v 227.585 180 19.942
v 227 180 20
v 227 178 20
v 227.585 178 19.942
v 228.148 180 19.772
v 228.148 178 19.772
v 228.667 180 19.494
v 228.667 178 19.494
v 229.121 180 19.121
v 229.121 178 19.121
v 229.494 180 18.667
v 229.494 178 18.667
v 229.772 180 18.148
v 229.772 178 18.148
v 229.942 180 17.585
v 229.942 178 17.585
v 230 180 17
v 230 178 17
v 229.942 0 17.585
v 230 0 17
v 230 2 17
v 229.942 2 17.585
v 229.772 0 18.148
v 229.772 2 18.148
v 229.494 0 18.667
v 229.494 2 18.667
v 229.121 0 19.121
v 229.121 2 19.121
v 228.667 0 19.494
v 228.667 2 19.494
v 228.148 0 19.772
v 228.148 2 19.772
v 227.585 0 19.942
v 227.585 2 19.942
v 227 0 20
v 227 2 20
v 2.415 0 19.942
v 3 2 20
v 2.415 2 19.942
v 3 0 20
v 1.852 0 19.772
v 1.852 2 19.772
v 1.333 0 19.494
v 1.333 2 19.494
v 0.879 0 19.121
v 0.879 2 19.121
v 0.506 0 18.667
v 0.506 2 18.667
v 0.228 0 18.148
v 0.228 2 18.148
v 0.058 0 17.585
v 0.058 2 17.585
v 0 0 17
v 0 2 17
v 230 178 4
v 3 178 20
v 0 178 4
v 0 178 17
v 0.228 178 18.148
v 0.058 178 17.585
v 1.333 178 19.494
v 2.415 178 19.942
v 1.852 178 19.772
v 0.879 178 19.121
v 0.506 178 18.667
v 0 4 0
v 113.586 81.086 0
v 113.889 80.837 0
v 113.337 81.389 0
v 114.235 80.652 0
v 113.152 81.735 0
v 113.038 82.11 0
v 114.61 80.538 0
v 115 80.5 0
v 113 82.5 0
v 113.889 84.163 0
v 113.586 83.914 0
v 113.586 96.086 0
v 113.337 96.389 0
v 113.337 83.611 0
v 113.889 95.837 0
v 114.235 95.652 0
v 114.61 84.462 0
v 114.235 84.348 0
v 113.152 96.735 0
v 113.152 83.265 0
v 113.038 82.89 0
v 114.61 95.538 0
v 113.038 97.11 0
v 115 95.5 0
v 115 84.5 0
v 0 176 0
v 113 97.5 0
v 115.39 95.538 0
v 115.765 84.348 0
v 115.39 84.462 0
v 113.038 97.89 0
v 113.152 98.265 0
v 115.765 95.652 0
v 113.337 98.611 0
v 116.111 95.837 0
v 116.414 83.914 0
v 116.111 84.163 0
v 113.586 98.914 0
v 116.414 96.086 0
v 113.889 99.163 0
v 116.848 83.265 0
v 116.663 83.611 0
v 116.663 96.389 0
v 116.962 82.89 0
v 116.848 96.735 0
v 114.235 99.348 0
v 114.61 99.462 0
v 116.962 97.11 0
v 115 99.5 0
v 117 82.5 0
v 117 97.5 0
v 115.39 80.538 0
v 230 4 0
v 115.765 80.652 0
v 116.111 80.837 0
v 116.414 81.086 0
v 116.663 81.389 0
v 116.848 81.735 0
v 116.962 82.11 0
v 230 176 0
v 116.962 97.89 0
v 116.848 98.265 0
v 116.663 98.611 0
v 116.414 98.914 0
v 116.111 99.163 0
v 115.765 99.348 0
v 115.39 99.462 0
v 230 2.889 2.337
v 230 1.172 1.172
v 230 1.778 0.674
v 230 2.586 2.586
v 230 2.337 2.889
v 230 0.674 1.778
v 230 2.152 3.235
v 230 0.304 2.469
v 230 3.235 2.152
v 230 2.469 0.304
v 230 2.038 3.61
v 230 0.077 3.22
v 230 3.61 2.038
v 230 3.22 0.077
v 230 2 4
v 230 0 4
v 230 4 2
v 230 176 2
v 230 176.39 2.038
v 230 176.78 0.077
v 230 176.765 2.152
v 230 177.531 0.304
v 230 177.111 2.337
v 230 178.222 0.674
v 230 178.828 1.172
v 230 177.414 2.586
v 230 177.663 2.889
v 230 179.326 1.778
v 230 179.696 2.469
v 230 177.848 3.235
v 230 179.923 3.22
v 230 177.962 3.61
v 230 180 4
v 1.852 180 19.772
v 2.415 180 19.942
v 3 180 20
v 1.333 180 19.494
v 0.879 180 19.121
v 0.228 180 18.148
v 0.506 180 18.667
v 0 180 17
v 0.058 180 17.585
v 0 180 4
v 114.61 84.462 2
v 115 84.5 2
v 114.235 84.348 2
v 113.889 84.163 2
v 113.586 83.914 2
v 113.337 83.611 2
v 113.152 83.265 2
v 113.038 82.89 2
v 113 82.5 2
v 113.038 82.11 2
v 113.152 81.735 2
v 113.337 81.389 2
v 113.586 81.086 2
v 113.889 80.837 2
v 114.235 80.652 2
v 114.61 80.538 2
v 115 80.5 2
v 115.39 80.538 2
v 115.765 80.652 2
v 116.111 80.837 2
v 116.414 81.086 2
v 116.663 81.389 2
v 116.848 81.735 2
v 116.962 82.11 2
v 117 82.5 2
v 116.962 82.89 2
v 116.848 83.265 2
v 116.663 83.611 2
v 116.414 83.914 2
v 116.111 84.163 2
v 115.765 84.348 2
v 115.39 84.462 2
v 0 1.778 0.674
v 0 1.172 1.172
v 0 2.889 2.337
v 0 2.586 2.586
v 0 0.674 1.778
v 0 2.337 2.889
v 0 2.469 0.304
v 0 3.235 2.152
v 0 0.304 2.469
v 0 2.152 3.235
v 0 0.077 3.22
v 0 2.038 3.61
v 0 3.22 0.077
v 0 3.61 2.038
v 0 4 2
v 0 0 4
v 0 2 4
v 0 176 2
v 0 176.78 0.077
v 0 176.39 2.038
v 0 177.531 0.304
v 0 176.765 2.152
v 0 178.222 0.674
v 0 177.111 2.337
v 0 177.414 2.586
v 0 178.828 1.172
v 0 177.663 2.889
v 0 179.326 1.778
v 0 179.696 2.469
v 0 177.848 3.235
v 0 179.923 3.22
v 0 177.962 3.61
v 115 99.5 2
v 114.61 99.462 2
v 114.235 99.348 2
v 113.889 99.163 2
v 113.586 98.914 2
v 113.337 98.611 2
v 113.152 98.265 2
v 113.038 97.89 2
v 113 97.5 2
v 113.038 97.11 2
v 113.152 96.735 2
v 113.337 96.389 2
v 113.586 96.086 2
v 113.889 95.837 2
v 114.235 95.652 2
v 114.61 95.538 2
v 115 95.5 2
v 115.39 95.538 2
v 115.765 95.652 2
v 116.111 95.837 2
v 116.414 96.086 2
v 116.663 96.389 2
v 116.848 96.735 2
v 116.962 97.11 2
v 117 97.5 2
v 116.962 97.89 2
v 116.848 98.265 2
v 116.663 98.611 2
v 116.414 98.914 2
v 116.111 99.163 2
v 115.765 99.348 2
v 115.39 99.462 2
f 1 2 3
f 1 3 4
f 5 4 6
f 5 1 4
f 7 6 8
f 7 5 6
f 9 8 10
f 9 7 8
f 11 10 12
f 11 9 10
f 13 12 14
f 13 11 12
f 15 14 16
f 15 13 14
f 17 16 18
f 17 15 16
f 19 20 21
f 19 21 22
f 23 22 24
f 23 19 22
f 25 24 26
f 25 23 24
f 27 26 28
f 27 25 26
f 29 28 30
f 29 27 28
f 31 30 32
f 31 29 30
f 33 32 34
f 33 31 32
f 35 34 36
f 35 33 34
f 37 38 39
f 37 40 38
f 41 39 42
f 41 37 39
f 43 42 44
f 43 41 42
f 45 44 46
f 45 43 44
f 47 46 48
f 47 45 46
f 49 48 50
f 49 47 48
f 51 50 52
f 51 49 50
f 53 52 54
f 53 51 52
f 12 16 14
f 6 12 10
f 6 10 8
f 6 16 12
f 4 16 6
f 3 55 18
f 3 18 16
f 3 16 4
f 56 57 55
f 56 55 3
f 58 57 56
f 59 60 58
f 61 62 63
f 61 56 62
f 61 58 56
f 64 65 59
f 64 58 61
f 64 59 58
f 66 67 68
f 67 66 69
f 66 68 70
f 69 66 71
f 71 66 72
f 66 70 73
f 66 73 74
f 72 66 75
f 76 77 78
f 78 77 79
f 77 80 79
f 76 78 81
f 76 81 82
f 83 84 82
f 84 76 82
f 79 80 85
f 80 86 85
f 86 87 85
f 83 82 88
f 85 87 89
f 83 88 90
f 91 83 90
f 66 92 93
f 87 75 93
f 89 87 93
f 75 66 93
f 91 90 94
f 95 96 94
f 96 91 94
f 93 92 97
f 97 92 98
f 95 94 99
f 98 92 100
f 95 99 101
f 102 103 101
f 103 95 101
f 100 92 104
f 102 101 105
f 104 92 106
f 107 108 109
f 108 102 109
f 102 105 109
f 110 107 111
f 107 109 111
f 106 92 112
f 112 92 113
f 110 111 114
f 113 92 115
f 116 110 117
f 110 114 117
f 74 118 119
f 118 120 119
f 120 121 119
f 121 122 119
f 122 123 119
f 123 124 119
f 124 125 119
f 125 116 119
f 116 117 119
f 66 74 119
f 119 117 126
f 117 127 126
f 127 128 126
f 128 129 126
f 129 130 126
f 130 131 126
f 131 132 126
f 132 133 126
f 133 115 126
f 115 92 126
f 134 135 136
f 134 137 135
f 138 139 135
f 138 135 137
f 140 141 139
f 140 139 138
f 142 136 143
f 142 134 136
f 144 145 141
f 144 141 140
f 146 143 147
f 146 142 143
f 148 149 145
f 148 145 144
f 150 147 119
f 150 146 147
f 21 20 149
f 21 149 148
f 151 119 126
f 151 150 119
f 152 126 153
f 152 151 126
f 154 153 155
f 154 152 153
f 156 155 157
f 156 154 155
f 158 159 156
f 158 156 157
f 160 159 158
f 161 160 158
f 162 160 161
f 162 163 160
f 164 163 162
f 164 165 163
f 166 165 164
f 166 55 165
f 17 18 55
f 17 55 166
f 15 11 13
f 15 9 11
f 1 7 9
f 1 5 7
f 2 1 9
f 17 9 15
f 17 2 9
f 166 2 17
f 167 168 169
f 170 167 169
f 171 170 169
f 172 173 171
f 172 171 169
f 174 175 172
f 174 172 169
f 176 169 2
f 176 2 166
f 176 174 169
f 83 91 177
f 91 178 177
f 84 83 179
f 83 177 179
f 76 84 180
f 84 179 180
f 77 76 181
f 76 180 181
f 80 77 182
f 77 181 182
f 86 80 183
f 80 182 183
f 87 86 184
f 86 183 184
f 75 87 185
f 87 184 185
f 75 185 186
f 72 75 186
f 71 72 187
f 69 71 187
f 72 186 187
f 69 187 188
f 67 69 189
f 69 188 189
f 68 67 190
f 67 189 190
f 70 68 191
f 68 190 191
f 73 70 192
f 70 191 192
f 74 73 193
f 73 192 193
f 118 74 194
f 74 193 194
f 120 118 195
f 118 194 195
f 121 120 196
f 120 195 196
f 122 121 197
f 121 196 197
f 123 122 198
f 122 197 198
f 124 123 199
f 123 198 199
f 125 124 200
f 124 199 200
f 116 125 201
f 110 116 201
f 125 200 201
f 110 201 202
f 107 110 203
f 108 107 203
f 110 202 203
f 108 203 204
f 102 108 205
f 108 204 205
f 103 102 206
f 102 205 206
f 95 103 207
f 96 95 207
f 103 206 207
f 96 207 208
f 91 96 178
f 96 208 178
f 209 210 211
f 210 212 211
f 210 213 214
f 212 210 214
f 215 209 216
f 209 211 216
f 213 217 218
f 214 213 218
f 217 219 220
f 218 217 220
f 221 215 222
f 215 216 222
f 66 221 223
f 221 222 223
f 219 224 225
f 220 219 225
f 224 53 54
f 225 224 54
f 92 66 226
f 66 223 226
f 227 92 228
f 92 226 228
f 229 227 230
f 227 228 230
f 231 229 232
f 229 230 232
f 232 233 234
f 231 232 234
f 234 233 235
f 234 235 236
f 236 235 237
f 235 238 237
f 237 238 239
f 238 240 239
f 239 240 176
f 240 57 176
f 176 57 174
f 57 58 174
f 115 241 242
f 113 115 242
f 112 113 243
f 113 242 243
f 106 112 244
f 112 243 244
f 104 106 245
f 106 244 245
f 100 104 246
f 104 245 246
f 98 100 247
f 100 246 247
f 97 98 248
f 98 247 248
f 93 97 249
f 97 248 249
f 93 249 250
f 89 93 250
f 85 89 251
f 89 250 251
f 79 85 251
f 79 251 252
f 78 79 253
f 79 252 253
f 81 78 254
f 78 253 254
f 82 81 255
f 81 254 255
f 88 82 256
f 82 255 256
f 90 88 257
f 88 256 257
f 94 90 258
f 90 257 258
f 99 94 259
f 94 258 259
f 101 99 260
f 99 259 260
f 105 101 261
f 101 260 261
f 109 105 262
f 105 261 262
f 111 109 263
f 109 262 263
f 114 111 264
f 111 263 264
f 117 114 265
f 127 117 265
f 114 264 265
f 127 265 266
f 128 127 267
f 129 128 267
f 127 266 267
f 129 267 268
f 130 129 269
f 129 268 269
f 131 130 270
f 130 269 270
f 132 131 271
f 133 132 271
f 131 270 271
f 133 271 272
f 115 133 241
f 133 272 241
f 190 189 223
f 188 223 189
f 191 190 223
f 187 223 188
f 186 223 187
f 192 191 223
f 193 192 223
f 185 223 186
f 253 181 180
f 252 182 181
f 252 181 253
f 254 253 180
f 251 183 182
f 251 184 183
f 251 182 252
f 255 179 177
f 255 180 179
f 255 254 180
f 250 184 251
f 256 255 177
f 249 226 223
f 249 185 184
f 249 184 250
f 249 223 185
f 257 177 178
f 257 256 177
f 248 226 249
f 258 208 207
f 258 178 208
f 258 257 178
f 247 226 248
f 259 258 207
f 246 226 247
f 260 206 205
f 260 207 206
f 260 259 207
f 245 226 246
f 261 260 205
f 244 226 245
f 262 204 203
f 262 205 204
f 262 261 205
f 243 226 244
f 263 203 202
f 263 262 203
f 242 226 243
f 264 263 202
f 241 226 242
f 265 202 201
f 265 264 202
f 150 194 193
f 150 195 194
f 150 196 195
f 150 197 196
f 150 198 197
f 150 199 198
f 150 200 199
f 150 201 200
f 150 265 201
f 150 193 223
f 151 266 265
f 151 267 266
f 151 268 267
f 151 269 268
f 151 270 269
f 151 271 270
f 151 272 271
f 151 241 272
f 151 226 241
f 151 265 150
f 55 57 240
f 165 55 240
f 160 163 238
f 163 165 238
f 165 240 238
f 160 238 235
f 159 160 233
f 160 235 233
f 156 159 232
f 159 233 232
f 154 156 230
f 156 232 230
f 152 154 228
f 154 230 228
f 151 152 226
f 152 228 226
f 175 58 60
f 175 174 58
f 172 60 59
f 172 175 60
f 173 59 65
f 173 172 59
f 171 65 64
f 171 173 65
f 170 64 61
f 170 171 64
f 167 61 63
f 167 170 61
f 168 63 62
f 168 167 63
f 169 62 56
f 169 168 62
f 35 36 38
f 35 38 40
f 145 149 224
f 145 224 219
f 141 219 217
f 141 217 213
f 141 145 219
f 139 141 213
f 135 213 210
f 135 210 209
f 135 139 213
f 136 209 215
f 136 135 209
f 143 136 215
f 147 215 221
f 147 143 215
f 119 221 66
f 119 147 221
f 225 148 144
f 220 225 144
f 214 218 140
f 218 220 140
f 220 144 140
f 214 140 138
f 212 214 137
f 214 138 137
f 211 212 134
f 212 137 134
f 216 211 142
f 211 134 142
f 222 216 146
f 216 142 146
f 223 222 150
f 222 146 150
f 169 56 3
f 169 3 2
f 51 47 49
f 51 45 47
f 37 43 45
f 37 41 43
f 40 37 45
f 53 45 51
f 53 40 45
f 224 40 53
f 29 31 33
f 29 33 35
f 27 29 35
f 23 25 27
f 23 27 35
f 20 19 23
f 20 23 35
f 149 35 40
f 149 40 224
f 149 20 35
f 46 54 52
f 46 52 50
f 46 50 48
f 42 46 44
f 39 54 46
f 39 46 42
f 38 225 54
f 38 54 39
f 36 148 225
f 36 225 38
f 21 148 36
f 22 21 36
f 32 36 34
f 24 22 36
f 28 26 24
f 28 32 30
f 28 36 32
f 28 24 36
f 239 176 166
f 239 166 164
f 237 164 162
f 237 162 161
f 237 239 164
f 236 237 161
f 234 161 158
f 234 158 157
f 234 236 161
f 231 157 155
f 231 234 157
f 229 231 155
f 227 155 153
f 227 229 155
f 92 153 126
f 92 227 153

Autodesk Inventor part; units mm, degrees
ref_plane "YZ Plane" through (0, 0, 0) normal (1, 0, 0) x (0, 1, 0)
ref_plane "XZ Plane" through (0, 0, 0) normal (0, 1, 0) x (-1, 0, 0)
ref_plane "XY Plane" through (0, 0, 0) normal (0, 0, 1) x (1, 0, 0)
sketch "Skizze1" plane through (0, 0, 0) normal (0, 0, 1) x (1, 0, 0)
  line L0 (0, 0) -> (230, 0)
  line L1 (230, 0) -> (230, 180)
  line L2 (230, 180) -> (0, 180)
  line L3 (0, 180) -> (0, 0)
  dimension "d0" = 230
  dimension "d1" = 180
extrude "Grobblech1" add sketch "Skizze1" along normal blind 2
sketch "Skizze2" plane through (230, 2, 0) normal (0, -1, 0) x (1, 0, 0)
  line L0 (-230, 0) -> (0, 0)
  line L1 (0, 0) -> (0, 20)
  line L2 (0, 20) -> (-230, 20)
  line L3 (-230, 20) -> (-230, 0)
edge flange "Lasche1" height 20 angle 90 thickness 2 bend radius 2 thickness toward (0, -1, 0) relief tear relief width 2 relief depth 1 corner gap 2 corner form 0 edges at (115, 0, 2) (115, 180, 2) wall of the first edge with corners at (0, 2, 0) (230, 2, 0) (230, 2, 20) (0, 2, 20)
bend "Biegung1"
corner "Ecke1"
sketch "Skizze3" plane through (0, 0, 0) normal (0, 0, -1) x (-1, 0, 0)
  circle A0 centre (-36.5, 97.5) radius 1.621 projected
  circle A1 centre (-36.5, 82.5) radius 1.621 projected
  circle A2 centre (-193.5, 97.5) radius 1.621 projected
  circle A3 centre (-193.5, 82.5) radius 1.621 projected
  line L0 (0, 0) -> (-36.5, 0)
  line L1 (-36.5, 0) -> (-36.5, 82.5)
  line L2 (-36.5, 82.5) -> (0, 82.5)
  line L3 (0, 82.5) -> (0, 0)
  line L4 (-36.5, 82.5) -> (-193.5, 82.5)
  line L5 (-193.5, 82.5) -> (-193.5, 97.5)
  line L6 (-193.5, 97.5) -> (-36.5, 97.5)
  line L7 (-36.5, 97.5) -> (-36.5, 82.5)
  circle A4 centre (-115, 97.5) radius 1.621 projected
  circle A5 centre (-115, 82.5) radius 1.621 projected
hole "Bohrung1" at (115, 97.5, 0) at (115, 82.5, 0) direction (0, 0, 1) diameter 4 depth 2 tip angle 118
fillet "Eckenrundung1" radius 3 4 edges at (230, 1, 20) (230, 179, 20) (0, 179, 20) (0, 1, 20)
equation "\"d19\" = Stärke"
equation "\"d2\" = Stärke"
equation "\"d3\" = BreiteBiegungsfreistellung"
equation "\"d4\" = TiefeBiegungsfreistellung"
equation "\"d5\" = MinimalRest"
equation "\"d6\" = Übergangsradius"
equation "\"d9\" = Biegeradius"
equation "\"d10\" = GrößeEckenfreistellung"
equation "\"d11\" = Abstandsgröße"
equation "\"d12\" = JacobiRadiusGröße"
equation "\"Biegeradius\" = Stärke"
equation "\"BreiteBiegungsfreistellung\" = Stärke"
equation "\"TiefeBiegungsfreistellung\" = 0.5 * Stärke"
equation "\"GrößeEckenfreistellung\" = 4 * Stärke"
equation "\"MinimalRest\" = 2 * Stärke"
equation "\"Übergangsradius\" = Biegeradius"
equation "\"JacobiRadiusGröße\" = Biegeradius"
equation "\"Abstandsgröße\" = Stärke"
equation "\"Stärke\" = 2"
properties part number "Schale"
